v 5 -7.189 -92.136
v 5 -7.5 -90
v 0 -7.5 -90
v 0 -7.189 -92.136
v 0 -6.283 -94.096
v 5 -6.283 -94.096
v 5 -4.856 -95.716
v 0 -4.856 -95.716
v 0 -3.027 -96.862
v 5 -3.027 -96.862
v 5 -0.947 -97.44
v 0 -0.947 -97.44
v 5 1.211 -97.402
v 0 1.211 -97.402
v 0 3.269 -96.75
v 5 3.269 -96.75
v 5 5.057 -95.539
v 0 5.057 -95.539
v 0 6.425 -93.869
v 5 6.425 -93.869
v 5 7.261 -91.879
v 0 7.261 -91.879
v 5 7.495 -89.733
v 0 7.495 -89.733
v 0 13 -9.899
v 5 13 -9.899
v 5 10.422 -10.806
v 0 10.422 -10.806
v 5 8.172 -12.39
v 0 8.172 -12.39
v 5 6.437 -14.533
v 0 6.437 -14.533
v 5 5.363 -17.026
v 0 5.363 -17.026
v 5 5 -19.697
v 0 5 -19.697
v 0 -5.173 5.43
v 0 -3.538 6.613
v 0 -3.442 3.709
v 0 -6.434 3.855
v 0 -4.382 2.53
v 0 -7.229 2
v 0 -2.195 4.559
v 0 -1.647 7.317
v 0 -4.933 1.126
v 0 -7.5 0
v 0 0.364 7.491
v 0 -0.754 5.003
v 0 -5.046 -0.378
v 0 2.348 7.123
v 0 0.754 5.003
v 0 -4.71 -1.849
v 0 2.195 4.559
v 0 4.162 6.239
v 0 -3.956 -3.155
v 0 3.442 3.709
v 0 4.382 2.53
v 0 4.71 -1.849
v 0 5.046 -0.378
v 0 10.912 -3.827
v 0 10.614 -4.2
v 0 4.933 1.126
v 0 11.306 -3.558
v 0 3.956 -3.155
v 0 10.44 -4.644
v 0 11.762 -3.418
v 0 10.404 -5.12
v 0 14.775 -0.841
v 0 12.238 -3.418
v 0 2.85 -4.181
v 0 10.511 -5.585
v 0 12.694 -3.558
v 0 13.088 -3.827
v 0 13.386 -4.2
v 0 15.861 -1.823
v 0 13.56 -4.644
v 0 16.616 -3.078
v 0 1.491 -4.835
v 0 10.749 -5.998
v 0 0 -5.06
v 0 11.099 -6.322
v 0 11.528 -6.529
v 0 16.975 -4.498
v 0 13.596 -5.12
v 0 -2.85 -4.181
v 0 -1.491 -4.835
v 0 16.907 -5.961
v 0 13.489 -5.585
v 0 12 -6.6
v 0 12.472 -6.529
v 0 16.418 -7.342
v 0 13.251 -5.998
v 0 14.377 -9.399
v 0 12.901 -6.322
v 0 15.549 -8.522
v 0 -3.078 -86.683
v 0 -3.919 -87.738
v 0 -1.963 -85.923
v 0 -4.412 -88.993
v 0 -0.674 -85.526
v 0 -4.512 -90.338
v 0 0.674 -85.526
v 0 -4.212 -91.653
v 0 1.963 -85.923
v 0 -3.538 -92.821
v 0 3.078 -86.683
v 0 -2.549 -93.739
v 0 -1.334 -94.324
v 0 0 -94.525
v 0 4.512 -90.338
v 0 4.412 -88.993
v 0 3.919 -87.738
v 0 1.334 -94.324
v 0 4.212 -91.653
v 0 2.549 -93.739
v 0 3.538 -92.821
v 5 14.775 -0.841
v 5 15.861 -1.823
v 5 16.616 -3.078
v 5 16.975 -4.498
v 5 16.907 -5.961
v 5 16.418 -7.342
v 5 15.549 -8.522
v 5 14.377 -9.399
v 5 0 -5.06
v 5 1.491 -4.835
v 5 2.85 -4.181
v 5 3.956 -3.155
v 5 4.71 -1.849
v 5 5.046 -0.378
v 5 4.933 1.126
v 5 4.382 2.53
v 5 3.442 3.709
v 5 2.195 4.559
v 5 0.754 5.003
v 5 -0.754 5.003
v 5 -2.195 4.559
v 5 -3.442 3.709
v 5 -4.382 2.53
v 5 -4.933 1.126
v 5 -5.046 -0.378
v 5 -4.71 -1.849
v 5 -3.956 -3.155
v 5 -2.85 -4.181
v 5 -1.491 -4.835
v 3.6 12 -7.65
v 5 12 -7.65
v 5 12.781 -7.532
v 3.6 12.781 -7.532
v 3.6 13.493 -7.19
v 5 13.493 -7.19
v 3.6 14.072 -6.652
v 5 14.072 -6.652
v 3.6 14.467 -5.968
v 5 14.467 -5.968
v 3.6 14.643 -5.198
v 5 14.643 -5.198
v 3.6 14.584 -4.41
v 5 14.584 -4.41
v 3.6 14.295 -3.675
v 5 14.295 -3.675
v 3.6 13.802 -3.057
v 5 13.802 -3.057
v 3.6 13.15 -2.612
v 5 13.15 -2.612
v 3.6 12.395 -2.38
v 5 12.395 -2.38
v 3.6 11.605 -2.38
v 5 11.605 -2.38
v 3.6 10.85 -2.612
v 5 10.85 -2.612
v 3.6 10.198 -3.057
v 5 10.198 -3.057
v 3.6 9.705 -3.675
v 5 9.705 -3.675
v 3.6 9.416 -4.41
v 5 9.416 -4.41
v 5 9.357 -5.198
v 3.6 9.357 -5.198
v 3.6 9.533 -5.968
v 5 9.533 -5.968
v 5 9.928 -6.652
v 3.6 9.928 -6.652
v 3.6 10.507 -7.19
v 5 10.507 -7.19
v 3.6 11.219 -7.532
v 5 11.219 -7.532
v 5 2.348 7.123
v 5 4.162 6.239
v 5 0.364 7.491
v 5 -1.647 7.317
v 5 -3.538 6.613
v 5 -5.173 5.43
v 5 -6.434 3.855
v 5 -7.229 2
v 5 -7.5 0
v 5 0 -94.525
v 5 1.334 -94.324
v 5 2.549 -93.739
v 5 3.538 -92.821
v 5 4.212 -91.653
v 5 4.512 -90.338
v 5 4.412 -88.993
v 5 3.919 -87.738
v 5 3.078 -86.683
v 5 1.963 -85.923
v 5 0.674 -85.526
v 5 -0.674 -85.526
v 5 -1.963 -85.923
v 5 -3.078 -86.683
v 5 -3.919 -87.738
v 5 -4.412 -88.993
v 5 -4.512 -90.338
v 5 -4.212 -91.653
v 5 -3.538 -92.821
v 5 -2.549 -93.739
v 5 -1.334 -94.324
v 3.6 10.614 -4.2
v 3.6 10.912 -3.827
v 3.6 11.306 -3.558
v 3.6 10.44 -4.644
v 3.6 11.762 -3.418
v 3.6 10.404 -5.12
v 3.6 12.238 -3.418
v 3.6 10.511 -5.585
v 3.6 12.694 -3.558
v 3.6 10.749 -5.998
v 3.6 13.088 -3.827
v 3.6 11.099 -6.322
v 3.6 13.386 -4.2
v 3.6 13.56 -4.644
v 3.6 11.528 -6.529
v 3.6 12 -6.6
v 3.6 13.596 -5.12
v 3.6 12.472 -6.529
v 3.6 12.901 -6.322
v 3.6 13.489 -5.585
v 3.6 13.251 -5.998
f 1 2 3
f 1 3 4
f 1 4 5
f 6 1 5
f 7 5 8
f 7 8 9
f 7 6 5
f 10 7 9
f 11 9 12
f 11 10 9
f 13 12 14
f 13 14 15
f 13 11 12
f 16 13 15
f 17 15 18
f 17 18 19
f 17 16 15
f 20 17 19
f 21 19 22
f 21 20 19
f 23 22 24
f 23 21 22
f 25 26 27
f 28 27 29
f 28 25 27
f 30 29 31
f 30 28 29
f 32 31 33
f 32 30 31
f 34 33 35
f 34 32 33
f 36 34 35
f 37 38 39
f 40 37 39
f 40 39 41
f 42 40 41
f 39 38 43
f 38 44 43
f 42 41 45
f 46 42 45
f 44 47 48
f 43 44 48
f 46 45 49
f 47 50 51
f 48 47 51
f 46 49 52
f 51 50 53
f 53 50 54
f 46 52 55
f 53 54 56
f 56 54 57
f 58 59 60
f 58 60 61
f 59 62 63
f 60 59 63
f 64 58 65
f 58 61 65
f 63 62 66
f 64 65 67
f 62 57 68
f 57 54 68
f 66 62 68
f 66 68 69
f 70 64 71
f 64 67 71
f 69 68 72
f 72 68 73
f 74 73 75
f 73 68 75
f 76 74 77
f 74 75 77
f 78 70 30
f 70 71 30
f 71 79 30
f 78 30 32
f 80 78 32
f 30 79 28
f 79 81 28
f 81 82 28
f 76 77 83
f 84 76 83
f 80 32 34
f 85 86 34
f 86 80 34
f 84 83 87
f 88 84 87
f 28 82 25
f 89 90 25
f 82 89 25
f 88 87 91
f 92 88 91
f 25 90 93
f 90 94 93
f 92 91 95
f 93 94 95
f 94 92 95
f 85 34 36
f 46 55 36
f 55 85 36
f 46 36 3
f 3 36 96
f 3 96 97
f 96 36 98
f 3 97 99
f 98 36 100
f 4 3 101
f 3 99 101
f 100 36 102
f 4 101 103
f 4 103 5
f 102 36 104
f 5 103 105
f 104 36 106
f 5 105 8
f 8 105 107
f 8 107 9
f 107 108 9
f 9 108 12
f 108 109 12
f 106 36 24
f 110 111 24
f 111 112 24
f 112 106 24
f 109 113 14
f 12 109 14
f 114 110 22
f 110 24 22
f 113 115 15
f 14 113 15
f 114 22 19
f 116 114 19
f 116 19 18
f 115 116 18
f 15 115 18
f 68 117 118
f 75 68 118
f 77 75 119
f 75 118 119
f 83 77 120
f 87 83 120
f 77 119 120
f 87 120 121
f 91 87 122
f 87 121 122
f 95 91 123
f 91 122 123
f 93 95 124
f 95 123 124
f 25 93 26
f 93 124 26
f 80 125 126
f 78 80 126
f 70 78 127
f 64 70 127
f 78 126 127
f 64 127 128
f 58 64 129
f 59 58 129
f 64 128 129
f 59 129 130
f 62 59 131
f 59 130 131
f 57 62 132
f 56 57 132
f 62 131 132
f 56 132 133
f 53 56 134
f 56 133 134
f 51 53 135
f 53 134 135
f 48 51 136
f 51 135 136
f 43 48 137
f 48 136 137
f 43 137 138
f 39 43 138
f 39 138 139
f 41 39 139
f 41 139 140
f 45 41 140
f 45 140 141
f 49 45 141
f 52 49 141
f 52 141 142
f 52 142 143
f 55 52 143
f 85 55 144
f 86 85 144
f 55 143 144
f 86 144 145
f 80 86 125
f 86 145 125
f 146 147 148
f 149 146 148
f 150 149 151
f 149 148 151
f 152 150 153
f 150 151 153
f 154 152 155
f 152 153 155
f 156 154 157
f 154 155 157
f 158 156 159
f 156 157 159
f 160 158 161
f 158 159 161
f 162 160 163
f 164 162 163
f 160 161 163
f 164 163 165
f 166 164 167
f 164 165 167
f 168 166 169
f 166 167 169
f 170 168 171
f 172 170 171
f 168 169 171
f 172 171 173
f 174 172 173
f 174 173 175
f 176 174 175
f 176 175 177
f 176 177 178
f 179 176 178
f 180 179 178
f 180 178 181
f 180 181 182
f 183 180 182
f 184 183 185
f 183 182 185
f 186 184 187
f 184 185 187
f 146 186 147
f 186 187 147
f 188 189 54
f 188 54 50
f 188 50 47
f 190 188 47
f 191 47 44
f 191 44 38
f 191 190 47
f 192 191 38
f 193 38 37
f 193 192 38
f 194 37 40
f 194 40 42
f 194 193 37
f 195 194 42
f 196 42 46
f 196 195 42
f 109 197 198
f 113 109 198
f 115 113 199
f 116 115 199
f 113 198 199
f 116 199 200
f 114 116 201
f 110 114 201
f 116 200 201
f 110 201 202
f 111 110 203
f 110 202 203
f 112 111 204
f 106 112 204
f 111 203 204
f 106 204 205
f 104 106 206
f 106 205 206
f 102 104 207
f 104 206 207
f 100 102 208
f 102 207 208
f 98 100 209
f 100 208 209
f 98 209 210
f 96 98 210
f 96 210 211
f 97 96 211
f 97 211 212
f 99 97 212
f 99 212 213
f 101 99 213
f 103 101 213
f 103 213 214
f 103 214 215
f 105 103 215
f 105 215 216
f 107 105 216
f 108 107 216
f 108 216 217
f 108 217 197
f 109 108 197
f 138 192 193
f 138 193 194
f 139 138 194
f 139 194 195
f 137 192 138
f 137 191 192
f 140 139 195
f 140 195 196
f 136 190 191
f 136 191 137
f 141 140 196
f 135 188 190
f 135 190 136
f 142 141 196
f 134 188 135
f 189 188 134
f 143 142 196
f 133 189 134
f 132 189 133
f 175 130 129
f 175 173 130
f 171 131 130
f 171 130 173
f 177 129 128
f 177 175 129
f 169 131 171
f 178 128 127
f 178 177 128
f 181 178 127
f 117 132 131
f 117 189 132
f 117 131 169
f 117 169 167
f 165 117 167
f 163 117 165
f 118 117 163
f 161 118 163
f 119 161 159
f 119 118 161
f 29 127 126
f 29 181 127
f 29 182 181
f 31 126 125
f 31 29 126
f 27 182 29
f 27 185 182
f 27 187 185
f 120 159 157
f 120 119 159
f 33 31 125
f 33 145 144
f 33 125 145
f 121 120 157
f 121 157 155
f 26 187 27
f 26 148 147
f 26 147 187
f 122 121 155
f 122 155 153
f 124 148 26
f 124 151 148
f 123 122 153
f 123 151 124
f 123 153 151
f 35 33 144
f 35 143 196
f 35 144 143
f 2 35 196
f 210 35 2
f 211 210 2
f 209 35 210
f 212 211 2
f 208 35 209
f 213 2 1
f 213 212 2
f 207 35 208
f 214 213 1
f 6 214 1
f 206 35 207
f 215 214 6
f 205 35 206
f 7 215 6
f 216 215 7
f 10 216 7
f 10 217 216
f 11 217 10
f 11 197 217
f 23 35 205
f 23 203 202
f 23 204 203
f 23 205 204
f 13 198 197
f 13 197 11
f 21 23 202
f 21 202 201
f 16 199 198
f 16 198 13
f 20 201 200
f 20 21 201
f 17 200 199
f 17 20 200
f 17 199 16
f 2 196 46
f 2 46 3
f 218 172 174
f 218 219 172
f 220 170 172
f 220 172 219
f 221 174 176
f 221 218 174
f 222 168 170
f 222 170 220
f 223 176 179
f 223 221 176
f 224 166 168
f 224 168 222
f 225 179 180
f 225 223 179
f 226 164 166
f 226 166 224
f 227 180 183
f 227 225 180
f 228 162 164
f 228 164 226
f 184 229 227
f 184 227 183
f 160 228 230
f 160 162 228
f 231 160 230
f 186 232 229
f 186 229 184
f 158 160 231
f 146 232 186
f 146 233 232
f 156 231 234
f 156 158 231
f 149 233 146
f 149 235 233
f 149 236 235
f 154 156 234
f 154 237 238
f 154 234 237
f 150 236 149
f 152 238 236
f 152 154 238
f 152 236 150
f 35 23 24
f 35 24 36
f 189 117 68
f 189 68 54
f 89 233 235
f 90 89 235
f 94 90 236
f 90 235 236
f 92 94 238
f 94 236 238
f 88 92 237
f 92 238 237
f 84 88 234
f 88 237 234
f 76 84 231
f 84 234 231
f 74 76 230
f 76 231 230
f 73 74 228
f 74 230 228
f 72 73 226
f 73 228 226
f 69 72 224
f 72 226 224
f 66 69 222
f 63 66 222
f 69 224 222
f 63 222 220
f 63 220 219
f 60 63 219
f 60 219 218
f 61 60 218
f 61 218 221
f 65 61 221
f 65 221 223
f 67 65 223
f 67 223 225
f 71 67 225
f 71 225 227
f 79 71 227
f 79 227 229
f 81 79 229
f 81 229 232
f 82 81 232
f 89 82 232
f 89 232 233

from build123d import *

# Parameters (mm, degrees)
SKETCH_1_R          = 2.5
SKETCH_1_R_2        = 2.05
EXTRUDE_1_DEPTH     = 5
SKETCH_2_R          = 2.5
EXTRUDE_2_DEPTH     = 5
FILLET_1_R          = 6
FILLET_2_R          = 10
SKETCH_3_R          = 1.6
EXTRUDE_3_DEPTH     = 5
FILLET_3_R          = 10
SKETCH_4_W          = 47.859617289
SKETCH_4_H          = 15
CUT_EXTRUDE_1_DEPTH = 6.0000001
SKETCH_6_R          = 2.65
CUT_EXTRUDE_2_DEPTH = 1.4
EXTRUDE_5_DEPTH     = 5
SKETCH_11_R         = 4.525
CUT_EXTRUDE_4_DEPTH = 6.0000001
SKETCH_13_R         = 5.06
CUT_EXTRUDE_5_DEPTH = 5


with BuildPart() as part:
    # 草图1 → 凸台-拉伸1 (new body)
    with BuildSketch(Plane(origin=(0, 0, 0), x_dir=(0, 0, -1), z_dir=(1, 0, 0))):
        with BuildLine():
            Line((0, 5), (90, 5))
            ThreePointArc((90, 5), (95, 0), (90, -5))
            Line((90, -5), (0, -5))
            ThreePointArc((0, -5), (-5, 0), (0, 5))
        make_face()
        Circle(SKETCH_1_R, mode=Mode.SUBTRACT)
        with Locations((90, 0)):
            Circle(SKETCH_1_R_2, mode=Mode.SUBTRACT)
    extrude(amount=EXTRUDE_1_DEPTH)

    # 草图2 → 凸台-拉伸2 (add)
    with BuildSketch(Plane(origin=(5, 0, 0), x_dir=(0, 0, -1), z_dir=(1, 0, 0))):
        with BuildLine():
            Line((49.91480075, 7.043176995), (48.200371687, 5))
            Line((48.200371687, 5), (36.190624625, 5))
            Line((36.190624625, 5), (42.867191873, 12.956823005))
            ThreePointArc((42.867191873, 12.956823005), (49.347819316, 13.523804438), (49.91480075, 7.043176995))
        make_face()
        with Locations((46.390996312, 10)):
            Circle(SKETCH_2_R, mode=Mode.SUBTRACT)
    extrude(amount=-EXTRUDE_2_DEPTH)

    # 圆角1
    fillet_1_edges = [part.edges().sort_by_distance(p)[0] for p in [
        (2.5, 5, -48.200371687),
    ]]
    fillet(fillet_1_edges, radius=FILLET_1_R)

    # 圆角2
    fillet_2_edges = [part.edges().sort_by_distance(p)[0] for p in [
        (2.5, 5, -36.190624625),
    ]]
    fillet(fillet_2_edges, radius=FILLET_2_R)

    # 草图3 → 凸台-拉伸3 (add)
    with BuildSketch(Plane(origin=(5, 0, 0), x_dir=(0, 0, -1), z_dir=(1, 0, 0))):
        with BuildLine():
            Line((-4.615384615, 1.923076923), (0.384615385, 13.923076923))
            ThreePointArc((0.384615385, 13.923076923), (6.923076923, 16.615384615), (9.615384615, 10.076923077))
            Line((9.615384615, 10.076923077), (7.5, 5))
            Line((7.5, 5), (0, 5))
            ThreePointArc((0, 5), (-2.773500981, 4.160251472), (-4.615384615, 1.923076923))
        make_face()
        with Locations((5, 12)):
            Circle(SKETCH_3_R, mode=Mode.SUBTRACT)
    extrude(amount=-EXTRUDE_3_DEPTH)

    # 圆角3
    fillet_3_edges = [part.edges().sort_by_distance(p)[0] for p in [
        (2.5, 5, -7.5),
    ]]
    fillet(fillet_3_edges, radius=FILLET_3_R)

    # 草图4 → 切除-拉伸1 (cut, through all)
    with BuildSketch(Plane(origin=(5, 0, 0), x_dir=(0, 0, -1), z_dir=(1, 0, 0))):
        with Locations((49.542051895, 12.5)):
            Rectangle(SKETCH_4_W, SKETCH_4_H)
    extrude(amount=-CUT_EXTRUDE_1_DEPTH, mode=Mode.SUBTRACT)

    # 草图6 → 切除-拉伸2 (cut)
    with BuildSketch(Plane(origin=(5, 0, 0), x_dir=(0, 0, -1), z_dir=(1, 0, 0))):
        with Locations((5, 12)):
            Circle(SKETCH_6_R)
    extrude(amount=-CUT_EXTRUDE_2_DEPTH, mode=Mode.SUBTRACT)

    # 草图10 → 凸台-拉伸5 (add)
    with BuildSketch(Plane(origin=(5, 0, 0), x_dir=(0, 0, -1), z_dir=(1, 0, 0))):
        with BuildLine():
            Line((89.732959314, 7.495244444), (19.696938457, 5))
            Line((19.696938457, 5), (90, 5))
            ThreePointArc((90, 5), (95, 0), (90, -5))
            Line((90, -5), (0, -5))
            ThreePointArc((0, -5), (-4.160251472, -2.773500981), (-4.615384615, 1.923076923))
            Line((-4.615384615, 1.923076923), (0.384615385, 13.923076923))
            ThreePointArc((0.384615385, 13.923076923), (0.591982965, 14.359954623), (0.840585507, 14.774756039))
            Line((0.840585507, 14.774756039), (-6.23912174, 4.162134058))
            ThreePointArc((-6.23912174, 4.162134058), (-6.613093279, -3.537936868), (0, -7.5))
            Line((0, -7.5), (90, -7.5))
            ThreePointArc((90, -7.5), (97.498811017, 0.133541513), (89.732959314, 7.495244444))
        make_face()
    extrude(amount=-EXTRUDE_5_DEPTH)

    # 草图11 → 切除-拉伸4 (cut, through all)
    with BuildSketch(Plane(origin=(5, 0, 0), x_dir=(0, 0, -1), z_dir=(1, 0, 0))):
        with Locations((90, 0)):
            Circle(SKETCH_11_R)
    extrude(amount=-CUT_EXTRUDE_4_DEPTH, mode=Mode.SUBTRACT)

    # 草图13 → 切除-拉伸5 (cut)
    with BuildSketch(Plane(origin=(5, 0, 0), x_dir=(0, 0, -1), z_dir=(1, 0, 0))):
        Circle(SKETCH_13_R)
    extrude(amount=-CUT_EXTRUDE_5_DEPTH, mode=Mode.SUBTRACT)


solid = part.part
